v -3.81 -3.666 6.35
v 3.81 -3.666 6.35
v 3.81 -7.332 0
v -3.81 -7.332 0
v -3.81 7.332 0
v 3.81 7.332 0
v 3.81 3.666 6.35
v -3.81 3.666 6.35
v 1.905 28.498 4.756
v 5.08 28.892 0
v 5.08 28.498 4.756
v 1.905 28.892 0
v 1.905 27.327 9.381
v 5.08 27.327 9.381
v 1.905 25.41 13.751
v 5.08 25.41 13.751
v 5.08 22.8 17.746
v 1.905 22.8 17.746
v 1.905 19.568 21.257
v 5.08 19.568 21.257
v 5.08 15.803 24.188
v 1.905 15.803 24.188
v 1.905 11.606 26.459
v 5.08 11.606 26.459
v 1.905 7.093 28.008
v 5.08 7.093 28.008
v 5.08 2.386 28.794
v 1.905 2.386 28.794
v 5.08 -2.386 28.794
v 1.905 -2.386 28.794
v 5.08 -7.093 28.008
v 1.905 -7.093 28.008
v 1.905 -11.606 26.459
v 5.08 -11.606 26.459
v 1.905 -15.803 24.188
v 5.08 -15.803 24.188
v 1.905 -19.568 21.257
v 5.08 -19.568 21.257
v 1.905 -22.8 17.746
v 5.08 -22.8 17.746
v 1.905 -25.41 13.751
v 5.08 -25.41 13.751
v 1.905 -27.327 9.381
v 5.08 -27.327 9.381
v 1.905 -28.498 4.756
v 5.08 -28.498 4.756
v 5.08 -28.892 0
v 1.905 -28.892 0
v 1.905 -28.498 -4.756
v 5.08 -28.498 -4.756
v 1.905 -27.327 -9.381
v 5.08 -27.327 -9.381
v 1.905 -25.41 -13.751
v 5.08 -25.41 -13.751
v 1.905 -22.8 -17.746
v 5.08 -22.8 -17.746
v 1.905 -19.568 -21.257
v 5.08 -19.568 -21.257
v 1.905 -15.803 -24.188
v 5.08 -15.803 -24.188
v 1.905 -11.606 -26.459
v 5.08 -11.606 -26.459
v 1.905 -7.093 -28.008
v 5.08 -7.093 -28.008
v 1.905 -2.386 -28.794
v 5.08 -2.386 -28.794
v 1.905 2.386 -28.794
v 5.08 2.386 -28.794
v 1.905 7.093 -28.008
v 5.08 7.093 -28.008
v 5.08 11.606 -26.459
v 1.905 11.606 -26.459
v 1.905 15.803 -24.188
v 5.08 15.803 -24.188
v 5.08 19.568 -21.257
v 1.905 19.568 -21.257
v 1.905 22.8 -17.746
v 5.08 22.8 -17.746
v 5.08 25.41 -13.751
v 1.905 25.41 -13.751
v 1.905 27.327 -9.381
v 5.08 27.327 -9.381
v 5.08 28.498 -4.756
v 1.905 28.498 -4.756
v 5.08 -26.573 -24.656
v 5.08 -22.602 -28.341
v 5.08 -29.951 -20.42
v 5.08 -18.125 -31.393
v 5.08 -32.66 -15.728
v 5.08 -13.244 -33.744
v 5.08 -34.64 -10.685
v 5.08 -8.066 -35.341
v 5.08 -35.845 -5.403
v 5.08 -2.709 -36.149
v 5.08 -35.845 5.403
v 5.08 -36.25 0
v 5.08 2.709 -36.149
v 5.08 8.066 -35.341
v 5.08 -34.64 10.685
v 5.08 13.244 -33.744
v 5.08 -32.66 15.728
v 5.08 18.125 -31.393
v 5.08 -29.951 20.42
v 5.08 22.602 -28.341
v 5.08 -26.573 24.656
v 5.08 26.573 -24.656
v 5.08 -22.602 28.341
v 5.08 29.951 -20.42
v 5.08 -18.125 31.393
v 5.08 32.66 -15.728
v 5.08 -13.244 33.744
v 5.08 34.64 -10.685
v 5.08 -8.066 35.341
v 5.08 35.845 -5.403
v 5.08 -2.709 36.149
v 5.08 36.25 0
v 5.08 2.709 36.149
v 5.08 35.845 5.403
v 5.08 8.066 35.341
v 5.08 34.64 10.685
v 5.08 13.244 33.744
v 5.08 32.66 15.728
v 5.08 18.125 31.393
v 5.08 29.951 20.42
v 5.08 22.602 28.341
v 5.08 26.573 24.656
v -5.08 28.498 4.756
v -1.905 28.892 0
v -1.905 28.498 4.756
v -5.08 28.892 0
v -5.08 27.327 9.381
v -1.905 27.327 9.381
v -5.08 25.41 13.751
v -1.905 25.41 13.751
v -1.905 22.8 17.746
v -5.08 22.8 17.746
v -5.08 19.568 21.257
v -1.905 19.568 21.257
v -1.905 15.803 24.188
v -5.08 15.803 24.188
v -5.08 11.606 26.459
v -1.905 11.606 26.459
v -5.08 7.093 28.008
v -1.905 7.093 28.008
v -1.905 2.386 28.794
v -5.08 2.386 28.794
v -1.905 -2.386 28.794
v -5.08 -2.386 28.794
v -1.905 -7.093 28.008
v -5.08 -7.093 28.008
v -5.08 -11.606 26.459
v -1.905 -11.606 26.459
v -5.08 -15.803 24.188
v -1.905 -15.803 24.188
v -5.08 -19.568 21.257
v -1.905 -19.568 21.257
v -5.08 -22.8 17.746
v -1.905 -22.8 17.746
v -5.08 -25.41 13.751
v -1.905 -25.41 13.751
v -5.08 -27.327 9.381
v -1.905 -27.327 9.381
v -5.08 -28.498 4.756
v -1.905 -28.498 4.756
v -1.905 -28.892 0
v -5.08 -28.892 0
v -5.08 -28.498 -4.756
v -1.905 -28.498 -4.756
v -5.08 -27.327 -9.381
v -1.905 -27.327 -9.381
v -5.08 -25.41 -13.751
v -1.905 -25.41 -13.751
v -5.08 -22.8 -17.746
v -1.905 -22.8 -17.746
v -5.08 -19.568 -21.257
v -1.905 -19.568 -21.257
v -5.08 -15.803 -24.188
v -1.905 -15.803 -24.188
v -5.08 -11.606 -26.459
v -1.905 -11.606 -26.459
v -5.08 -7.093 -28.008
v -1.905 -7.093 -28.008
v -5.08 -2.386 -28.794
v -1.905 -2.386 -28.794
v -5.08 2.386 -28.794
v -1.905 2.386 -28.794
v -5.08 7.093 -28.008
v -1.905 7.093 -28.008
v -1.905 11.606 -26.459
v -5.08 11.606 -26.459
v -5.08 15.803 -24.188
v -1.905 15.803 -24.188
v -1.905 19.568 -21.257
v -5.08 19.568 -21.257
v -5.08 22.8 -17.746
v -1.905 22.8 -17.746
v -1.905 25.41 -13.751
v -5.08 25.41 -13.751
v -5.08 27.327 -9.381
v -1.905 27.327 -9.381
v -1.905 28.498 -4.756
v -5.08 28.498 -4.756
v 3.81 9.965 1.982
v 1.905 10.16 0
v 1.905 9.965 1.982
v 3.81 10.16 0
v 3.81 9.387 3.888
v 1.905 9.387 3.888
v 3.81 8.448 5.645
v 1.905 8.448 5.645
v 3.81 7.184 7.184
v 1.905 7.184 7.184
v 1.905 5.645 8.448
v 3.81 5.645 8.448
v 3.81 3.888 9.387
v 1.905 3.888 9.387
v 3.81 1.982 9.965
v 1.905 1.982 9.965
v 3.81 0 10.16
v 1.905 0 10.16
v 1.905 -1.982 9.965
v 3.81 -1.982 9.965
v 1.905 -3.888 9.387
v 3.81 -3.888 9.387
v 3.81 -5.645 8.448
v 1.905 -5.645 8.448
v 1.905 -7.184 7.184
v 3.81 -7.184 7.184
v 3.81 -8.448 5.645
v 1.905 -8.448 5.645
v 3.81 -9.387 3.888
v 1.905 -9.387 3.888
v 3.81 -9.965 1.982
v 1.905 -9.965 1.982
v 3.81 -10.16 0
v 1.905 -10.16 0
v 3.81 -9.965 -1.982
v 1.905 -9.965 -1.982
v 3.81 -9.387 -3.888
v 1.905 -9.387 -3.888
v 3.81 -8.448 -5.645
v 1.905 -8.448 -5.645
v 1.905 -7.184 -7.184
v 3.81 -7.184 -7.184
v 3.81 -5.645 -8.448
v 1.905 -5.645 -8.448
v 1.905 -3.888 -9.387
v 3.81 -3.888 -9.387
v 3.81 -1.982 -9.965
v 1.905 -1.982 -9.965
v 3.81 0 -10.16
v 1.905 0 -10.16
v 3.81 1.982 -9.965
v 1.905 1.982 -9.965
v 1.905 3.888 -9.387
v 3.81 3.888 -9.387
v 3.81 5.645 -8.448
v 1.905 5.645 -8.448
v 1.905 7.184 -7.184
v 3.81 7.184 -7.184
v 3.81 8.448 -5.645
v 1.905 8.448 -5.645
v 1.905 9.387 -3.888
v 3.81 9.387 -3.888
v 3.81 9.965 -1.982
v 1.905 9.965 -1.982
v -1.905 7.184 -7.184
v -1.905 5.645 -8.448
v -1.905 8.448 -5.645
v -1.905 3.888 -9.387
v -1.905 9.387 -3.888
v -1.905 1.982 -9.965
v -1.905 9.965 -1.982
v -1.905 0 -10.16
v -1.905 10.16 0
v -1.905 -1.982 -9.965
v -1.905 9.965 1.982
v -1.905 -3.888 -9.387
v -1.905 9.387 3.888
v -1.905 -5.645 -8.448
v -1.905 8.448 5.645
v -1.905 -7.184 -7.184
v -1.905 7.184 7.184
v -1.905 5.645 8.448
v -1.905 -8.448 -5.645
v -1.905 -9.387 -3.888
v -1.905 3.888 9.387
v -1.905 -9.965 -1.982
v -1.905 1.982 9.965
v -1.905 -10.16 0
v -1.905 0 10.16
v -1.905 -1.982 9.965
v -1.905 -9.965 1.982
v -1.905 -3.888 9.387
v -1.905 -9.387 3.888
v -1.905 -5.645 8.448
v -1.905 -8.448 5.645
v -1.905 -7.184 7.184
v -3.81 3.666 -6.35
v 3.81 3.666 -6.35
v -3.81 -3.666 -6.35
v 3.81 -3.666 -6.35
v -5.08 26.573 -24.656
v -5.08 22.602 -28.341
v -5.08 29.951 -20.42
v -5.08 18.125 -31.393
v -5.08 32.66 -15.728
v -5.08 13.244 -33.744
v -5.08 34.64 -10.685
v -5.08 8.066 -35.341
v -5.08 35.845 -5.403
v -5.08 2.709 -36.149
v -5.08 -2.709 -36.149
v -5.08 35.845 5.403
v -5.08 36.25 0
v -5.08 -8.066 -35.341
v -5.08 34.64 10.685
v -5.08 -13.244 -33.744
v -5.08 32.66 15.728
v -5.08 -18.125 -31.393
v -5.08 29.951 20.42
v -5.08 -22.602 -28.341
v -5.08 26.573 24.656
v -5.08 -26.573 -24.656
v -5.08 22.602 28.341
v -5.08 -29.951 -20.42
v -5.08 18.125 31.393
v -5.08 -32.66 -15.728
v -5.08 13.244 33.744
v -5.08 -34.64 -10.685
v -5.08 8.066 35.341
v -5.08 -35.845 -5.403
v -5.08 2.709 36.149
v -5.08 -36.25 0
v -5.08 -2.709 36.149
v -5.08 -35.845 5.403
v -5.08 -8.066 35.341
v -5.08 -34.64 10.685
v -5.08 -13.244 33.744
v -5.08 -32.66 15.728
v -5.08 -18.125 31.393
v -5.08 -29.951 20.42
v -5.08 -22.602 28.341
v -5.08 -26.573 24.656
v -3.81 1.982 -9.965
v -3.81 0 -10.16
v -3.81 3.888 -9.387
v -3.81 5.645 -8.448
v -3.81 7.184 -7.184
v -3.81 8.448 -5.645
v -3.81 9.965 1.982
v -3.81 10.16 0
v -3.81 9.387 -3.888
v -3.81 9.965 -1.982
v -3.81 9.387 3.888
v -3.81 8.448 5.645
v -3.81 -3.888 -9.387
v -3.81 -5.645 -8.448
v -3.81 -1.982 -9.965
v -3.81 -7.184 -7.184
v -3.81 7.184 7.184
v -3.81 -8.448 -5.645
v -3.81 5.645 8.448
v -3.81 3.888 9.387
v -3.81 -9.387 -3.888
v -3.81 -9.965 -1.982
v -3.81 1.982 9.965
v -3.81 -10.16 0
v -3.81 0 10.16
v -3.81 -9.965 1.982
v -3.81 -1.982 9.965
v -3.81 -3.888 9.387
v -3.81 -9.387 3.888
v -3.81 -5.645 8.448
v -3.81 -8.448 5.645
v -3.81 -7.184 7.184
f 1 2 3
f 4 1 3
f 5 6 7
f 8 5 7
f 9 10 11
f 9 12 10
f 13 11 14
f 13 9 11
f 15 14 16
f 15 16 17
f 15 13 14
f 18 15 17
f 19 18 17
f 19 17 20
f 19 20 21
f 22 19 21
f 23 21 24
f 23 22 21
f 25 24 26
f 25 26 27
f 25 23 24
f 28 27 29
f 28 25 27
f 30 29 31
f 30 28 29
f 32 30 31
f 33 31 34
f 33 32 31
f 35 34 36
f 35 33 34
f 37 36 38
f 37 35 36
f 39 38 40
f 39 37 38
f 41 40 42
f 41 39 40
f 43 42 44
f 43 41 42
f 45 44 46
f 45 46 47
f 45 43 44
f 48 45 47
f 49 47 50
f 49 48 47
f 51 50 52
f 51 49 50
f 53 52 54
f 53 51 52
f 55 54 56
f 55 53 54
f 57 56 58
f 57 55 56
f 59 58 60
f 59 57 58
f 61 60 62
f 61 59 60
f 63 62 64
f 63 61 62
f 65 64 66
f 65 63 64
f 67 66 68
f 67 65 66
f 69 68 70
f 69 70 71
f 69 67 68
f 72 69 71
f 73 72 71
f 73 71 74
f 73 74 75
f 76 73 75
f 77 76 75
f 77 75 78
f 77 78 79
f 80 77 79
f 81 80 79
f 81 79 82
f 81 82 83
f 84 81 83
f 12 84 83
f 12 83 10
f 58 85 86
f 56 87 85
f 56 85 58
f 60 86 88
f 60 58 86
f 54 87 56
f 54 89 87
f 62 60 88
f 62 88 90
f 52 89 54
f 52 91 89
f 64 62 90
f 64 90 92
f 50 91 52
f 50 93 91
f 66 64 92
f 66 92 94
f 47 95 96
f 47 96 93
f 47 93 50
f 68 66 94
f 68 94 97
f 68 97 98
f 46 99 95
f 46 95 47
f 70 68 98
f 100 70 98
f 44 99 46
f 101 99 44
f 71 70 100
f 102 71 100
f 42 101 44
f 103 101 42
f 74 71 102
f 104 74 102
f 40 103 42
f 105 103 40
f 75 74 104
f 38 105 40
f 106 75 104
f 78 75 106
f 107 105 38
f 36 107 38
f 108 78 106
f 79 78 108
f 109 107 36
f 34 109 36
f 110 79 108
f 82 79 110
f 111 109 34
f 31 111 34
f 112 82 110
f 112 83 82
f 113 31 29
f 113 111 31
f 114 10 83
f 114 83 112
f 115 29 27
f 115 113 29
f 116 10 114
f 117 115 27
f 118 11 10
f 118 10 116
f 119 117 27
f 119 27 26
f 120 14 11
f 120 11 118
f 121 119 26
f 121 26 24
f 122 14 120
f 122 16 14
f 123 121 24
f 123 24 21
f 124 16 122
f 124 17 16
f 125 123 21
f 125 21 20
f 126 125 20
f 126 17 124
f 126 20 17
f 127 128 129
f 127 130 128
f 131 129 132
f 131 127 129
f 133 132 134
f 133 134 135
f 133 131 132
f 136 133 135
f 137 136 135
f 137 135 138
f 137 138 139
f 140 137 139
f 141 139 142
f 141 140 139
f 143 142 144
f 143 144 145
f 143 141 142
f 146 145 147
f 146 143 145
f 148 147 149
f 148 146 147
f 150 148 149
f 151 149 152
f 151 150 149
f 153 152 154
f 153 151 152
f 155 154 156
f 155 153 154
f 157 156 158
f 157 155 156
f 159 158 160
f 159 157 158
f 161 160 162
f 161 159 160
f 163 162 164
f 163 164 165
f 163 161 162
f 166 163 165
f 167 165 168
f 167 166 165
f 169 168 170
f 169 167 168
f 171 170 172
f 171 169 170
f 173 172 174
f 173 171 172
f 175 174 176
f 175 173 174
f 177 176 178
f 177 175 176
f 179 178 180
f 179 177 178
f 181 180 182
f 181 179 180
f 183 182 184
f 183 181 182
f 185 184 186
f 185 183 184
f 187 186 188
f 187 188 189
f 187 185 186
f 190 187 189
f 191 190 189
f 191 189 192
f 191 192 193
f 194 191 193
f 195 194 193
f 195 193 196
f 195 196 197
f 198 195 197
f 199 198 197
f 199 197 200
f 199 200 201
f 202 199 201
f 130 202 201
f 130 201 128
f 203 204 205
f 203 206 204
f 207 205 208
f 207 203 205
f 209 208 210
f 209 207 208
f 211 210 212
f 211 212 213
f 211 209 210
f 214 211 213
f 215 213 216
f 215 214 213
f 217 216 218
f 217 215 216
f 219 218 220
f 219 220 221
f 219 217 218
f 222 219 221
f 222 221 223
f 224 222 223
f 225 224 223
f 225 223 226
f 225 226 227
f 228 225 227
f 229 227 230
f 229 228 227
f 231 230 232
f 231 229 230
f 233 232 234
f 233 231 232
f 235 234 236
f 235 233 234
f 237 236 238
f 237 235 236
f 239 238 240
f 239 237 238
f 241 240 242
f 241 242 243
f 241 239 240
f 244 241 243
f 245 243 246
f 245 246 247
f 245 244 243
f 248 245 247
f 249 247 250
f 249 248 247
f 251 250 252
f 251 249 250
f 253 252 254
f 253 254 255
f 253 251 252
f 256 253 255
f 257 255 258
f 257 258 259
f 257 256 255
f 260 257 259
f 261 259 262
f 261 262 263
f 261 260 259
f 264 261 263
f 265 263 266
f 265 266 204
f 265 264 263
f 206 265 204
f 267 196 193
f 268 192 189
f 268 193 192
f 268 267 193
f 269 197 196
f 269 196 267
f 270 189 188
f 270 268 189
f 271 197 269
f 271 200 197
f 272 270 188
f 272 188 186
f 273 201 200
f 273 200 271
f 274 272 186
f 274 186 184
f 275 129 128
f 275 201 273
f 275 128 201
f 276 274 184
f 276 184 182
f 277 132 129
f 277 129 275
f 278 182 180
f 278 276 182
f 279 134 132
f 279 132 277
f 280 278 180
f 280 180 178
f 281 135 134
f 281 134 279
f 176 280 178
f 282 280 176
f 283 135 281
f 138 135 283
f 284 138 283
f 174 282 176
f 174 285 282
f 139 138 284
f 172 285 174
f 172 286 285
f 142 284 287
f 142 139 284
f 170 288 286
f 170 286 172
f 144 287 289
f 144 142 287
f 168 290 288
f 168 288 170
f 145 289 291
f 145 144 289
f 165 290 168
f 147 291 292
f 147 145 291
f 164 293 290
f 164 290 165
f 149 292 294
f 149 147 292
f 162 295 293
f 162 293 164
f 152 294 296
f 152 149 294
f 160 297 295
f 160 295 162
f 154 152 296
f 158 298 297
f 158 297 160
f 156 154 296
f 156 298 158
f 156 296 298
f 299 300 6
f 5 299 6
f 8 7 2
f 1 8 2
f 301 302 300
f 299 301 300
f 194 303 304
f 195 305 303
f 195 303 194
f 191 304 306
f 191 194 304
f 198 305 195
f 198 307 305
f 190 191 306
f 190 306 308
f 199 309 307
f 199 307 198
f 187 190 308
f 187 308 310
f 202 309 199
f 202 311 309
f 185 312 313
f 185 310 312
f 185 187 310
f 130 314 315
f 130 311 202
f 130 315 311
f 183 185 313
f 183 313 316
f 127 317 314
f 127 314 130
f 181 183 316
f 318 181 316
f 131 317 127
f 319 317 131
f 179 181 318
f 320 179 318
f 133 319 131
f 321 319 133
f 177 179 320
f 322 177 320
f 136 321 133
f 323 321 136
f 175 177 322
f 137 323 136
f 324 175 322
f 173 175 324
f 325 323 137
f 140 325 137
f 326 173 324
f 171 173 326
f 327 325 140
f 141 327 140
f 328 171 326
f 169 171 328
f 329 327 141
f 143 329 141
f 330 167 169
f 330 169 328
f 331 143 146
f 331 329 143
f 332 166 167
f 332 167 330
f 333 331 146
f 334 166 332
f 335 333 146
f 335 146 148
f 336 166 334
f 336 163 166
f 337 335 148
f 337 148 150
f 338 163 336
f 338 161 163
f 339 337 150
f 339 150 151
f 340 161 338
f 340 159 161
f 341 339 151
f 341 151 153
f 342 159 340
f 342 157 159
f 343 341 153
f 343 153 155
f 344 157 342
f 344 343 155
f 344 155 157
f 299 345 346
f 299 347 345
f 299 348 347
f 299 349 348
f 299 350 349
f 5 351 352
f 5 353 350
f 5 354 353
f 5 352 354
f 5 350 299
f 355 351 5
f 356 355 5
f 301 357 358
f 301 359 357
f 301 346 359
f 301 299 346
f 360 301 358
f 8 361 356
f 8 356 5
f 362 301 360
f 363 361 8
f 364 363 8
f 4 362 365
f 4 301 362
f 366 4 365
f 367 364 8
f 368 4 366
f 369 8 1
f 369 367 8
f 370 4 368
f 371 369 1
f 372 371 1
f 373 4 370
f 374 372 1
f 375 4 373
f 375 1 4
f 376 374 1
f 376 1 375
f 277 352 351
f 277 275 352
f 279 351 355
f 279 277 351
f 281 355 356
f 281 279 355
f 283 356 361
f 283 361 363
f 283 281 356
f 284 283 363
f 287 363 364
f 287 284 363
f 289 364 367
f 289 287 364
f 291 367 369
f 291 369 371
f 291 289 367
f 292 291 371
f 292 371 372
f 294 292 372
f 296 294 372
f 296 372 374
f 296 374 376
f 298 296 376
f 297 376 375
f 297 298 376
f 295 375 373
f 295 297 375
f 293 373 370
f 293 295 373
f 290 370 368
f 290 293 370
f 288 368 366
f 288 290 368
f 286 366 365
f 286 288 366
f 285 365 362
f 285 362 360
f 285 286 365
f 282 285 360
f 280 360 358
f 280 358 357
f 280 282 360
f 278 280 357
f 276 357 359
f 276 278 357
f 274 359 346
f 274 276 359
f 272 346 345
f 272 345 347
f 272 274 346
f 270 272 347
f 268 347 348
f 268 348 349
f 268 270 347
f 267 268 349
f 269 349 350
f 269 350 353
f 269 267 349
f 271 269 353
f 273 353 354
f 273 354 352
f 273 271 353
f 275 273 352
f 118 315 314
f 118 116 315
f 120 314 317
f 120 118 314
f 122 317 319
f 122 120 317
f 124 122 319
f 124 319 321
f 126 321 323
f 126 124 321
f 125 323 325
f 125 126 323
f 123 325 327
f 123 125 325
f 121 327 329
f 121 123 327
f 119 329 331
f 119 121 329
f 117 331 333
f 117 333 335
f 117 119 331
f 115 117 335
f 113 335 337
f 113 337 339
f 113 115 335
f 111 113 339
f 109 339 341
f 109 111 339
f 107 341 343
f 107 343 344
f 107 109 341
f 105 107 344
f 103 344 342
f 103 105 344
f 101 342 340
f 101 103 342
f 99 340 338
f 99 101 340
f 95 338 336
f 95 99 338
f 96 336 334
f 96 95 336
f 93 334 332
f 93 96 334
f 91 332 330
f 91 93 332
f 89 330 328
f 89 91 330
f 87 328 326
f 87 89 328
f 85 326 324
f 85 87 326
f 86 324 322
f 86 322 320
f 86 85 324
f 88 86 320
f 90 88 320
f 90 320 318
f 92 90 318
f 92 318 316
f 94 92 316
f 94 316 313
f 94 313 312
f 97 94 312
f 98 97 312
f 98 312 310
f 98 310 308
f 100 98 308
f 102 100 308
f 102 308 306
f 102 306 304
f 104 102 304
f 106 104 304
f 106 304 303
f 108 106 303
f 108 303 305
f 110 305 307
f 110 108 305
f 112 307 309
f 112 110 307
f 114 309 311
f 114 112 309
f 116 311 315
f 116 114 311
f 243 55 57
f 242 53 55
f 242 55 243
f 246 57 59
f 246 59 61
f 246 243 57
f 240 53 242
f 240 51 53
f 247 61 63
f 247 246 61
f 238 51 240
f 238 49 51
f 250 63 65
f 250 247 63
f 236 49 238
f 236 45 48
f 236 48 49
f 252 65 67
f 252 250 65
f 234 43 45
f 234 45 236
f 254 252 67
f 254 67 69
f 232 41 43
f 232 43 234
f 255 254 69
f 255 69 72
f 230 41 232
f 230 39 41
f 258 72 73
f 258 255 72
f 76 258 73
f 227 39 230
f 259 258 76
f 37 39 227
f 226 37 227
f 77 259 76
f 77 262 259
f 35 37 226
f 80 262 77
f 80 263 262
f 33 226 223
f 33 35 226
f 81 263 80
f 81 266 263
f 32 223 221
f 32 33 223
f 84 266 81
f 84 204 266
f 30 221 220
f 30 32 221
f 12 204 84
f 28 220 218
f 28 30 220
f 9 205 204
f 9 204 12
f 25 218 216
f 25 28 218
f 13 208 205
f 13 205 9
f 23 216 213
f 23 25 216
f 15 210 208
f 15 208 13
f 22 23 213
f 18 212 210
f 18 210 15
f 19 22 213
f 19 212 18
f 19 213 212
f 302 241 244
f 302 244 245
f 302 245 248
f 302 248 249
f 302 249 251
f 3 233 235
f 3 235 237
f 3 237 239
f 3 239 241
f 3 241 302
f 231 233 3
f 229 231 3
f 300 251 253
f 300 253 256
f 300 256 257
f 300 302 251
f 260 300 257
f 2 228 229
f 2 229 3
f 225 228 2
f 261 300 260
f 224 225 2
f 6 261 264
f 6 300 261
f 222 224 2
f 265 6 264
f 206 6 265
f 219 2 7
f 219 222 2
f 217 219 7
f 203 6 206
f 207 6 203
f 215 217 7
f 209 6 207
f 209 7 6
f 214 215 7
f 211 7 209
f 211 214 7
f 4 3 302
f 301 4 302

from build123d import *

# Parameters (mm, degrees)
ENL_V_MAT_EXTRU_1_DEPTH = 9.89


with BuildPart() as part:
    # Esquisse1 → Révolution1 (revolve)
    with BuildSketch(Plane.XY):
        Polygon((-5.08, 36.25), (5.08, 36.25), (5.08, 28.8925), (1.905, 28.8925), (1.905, 10.16), (3.81, 10.16), (3.81, 0), (-3.81, 0), (-3.81, 10.16), (-1.905, 10.16), (-1.905, 28.8925), (-5.08, 28.8925), align=None)
    revolve(axis=Axis((-12.56603466, 0, 0), (1, 0, 0)))

    # Esquisse2 → Enlèv. mat.-Extru.1 (cut, through all)
    with BuildSketch(Plane(origin=(3.81, 0, 0), x_dir=(0, 0, -1), z_dir=(1, 0, 0))):
        Polygon((0, 7.332348419), (-6.35, 3.666174209), (-6.35, -3.666174209), (0, -7.332348419), (6.35, -3.666174209), (6.35, 3.666174209), align=None)
    extrude(amount=-ENL_V_MAT_EXTRU_1_DEPTH, mode=Mode.SUBTRACT)


solid = part.part
